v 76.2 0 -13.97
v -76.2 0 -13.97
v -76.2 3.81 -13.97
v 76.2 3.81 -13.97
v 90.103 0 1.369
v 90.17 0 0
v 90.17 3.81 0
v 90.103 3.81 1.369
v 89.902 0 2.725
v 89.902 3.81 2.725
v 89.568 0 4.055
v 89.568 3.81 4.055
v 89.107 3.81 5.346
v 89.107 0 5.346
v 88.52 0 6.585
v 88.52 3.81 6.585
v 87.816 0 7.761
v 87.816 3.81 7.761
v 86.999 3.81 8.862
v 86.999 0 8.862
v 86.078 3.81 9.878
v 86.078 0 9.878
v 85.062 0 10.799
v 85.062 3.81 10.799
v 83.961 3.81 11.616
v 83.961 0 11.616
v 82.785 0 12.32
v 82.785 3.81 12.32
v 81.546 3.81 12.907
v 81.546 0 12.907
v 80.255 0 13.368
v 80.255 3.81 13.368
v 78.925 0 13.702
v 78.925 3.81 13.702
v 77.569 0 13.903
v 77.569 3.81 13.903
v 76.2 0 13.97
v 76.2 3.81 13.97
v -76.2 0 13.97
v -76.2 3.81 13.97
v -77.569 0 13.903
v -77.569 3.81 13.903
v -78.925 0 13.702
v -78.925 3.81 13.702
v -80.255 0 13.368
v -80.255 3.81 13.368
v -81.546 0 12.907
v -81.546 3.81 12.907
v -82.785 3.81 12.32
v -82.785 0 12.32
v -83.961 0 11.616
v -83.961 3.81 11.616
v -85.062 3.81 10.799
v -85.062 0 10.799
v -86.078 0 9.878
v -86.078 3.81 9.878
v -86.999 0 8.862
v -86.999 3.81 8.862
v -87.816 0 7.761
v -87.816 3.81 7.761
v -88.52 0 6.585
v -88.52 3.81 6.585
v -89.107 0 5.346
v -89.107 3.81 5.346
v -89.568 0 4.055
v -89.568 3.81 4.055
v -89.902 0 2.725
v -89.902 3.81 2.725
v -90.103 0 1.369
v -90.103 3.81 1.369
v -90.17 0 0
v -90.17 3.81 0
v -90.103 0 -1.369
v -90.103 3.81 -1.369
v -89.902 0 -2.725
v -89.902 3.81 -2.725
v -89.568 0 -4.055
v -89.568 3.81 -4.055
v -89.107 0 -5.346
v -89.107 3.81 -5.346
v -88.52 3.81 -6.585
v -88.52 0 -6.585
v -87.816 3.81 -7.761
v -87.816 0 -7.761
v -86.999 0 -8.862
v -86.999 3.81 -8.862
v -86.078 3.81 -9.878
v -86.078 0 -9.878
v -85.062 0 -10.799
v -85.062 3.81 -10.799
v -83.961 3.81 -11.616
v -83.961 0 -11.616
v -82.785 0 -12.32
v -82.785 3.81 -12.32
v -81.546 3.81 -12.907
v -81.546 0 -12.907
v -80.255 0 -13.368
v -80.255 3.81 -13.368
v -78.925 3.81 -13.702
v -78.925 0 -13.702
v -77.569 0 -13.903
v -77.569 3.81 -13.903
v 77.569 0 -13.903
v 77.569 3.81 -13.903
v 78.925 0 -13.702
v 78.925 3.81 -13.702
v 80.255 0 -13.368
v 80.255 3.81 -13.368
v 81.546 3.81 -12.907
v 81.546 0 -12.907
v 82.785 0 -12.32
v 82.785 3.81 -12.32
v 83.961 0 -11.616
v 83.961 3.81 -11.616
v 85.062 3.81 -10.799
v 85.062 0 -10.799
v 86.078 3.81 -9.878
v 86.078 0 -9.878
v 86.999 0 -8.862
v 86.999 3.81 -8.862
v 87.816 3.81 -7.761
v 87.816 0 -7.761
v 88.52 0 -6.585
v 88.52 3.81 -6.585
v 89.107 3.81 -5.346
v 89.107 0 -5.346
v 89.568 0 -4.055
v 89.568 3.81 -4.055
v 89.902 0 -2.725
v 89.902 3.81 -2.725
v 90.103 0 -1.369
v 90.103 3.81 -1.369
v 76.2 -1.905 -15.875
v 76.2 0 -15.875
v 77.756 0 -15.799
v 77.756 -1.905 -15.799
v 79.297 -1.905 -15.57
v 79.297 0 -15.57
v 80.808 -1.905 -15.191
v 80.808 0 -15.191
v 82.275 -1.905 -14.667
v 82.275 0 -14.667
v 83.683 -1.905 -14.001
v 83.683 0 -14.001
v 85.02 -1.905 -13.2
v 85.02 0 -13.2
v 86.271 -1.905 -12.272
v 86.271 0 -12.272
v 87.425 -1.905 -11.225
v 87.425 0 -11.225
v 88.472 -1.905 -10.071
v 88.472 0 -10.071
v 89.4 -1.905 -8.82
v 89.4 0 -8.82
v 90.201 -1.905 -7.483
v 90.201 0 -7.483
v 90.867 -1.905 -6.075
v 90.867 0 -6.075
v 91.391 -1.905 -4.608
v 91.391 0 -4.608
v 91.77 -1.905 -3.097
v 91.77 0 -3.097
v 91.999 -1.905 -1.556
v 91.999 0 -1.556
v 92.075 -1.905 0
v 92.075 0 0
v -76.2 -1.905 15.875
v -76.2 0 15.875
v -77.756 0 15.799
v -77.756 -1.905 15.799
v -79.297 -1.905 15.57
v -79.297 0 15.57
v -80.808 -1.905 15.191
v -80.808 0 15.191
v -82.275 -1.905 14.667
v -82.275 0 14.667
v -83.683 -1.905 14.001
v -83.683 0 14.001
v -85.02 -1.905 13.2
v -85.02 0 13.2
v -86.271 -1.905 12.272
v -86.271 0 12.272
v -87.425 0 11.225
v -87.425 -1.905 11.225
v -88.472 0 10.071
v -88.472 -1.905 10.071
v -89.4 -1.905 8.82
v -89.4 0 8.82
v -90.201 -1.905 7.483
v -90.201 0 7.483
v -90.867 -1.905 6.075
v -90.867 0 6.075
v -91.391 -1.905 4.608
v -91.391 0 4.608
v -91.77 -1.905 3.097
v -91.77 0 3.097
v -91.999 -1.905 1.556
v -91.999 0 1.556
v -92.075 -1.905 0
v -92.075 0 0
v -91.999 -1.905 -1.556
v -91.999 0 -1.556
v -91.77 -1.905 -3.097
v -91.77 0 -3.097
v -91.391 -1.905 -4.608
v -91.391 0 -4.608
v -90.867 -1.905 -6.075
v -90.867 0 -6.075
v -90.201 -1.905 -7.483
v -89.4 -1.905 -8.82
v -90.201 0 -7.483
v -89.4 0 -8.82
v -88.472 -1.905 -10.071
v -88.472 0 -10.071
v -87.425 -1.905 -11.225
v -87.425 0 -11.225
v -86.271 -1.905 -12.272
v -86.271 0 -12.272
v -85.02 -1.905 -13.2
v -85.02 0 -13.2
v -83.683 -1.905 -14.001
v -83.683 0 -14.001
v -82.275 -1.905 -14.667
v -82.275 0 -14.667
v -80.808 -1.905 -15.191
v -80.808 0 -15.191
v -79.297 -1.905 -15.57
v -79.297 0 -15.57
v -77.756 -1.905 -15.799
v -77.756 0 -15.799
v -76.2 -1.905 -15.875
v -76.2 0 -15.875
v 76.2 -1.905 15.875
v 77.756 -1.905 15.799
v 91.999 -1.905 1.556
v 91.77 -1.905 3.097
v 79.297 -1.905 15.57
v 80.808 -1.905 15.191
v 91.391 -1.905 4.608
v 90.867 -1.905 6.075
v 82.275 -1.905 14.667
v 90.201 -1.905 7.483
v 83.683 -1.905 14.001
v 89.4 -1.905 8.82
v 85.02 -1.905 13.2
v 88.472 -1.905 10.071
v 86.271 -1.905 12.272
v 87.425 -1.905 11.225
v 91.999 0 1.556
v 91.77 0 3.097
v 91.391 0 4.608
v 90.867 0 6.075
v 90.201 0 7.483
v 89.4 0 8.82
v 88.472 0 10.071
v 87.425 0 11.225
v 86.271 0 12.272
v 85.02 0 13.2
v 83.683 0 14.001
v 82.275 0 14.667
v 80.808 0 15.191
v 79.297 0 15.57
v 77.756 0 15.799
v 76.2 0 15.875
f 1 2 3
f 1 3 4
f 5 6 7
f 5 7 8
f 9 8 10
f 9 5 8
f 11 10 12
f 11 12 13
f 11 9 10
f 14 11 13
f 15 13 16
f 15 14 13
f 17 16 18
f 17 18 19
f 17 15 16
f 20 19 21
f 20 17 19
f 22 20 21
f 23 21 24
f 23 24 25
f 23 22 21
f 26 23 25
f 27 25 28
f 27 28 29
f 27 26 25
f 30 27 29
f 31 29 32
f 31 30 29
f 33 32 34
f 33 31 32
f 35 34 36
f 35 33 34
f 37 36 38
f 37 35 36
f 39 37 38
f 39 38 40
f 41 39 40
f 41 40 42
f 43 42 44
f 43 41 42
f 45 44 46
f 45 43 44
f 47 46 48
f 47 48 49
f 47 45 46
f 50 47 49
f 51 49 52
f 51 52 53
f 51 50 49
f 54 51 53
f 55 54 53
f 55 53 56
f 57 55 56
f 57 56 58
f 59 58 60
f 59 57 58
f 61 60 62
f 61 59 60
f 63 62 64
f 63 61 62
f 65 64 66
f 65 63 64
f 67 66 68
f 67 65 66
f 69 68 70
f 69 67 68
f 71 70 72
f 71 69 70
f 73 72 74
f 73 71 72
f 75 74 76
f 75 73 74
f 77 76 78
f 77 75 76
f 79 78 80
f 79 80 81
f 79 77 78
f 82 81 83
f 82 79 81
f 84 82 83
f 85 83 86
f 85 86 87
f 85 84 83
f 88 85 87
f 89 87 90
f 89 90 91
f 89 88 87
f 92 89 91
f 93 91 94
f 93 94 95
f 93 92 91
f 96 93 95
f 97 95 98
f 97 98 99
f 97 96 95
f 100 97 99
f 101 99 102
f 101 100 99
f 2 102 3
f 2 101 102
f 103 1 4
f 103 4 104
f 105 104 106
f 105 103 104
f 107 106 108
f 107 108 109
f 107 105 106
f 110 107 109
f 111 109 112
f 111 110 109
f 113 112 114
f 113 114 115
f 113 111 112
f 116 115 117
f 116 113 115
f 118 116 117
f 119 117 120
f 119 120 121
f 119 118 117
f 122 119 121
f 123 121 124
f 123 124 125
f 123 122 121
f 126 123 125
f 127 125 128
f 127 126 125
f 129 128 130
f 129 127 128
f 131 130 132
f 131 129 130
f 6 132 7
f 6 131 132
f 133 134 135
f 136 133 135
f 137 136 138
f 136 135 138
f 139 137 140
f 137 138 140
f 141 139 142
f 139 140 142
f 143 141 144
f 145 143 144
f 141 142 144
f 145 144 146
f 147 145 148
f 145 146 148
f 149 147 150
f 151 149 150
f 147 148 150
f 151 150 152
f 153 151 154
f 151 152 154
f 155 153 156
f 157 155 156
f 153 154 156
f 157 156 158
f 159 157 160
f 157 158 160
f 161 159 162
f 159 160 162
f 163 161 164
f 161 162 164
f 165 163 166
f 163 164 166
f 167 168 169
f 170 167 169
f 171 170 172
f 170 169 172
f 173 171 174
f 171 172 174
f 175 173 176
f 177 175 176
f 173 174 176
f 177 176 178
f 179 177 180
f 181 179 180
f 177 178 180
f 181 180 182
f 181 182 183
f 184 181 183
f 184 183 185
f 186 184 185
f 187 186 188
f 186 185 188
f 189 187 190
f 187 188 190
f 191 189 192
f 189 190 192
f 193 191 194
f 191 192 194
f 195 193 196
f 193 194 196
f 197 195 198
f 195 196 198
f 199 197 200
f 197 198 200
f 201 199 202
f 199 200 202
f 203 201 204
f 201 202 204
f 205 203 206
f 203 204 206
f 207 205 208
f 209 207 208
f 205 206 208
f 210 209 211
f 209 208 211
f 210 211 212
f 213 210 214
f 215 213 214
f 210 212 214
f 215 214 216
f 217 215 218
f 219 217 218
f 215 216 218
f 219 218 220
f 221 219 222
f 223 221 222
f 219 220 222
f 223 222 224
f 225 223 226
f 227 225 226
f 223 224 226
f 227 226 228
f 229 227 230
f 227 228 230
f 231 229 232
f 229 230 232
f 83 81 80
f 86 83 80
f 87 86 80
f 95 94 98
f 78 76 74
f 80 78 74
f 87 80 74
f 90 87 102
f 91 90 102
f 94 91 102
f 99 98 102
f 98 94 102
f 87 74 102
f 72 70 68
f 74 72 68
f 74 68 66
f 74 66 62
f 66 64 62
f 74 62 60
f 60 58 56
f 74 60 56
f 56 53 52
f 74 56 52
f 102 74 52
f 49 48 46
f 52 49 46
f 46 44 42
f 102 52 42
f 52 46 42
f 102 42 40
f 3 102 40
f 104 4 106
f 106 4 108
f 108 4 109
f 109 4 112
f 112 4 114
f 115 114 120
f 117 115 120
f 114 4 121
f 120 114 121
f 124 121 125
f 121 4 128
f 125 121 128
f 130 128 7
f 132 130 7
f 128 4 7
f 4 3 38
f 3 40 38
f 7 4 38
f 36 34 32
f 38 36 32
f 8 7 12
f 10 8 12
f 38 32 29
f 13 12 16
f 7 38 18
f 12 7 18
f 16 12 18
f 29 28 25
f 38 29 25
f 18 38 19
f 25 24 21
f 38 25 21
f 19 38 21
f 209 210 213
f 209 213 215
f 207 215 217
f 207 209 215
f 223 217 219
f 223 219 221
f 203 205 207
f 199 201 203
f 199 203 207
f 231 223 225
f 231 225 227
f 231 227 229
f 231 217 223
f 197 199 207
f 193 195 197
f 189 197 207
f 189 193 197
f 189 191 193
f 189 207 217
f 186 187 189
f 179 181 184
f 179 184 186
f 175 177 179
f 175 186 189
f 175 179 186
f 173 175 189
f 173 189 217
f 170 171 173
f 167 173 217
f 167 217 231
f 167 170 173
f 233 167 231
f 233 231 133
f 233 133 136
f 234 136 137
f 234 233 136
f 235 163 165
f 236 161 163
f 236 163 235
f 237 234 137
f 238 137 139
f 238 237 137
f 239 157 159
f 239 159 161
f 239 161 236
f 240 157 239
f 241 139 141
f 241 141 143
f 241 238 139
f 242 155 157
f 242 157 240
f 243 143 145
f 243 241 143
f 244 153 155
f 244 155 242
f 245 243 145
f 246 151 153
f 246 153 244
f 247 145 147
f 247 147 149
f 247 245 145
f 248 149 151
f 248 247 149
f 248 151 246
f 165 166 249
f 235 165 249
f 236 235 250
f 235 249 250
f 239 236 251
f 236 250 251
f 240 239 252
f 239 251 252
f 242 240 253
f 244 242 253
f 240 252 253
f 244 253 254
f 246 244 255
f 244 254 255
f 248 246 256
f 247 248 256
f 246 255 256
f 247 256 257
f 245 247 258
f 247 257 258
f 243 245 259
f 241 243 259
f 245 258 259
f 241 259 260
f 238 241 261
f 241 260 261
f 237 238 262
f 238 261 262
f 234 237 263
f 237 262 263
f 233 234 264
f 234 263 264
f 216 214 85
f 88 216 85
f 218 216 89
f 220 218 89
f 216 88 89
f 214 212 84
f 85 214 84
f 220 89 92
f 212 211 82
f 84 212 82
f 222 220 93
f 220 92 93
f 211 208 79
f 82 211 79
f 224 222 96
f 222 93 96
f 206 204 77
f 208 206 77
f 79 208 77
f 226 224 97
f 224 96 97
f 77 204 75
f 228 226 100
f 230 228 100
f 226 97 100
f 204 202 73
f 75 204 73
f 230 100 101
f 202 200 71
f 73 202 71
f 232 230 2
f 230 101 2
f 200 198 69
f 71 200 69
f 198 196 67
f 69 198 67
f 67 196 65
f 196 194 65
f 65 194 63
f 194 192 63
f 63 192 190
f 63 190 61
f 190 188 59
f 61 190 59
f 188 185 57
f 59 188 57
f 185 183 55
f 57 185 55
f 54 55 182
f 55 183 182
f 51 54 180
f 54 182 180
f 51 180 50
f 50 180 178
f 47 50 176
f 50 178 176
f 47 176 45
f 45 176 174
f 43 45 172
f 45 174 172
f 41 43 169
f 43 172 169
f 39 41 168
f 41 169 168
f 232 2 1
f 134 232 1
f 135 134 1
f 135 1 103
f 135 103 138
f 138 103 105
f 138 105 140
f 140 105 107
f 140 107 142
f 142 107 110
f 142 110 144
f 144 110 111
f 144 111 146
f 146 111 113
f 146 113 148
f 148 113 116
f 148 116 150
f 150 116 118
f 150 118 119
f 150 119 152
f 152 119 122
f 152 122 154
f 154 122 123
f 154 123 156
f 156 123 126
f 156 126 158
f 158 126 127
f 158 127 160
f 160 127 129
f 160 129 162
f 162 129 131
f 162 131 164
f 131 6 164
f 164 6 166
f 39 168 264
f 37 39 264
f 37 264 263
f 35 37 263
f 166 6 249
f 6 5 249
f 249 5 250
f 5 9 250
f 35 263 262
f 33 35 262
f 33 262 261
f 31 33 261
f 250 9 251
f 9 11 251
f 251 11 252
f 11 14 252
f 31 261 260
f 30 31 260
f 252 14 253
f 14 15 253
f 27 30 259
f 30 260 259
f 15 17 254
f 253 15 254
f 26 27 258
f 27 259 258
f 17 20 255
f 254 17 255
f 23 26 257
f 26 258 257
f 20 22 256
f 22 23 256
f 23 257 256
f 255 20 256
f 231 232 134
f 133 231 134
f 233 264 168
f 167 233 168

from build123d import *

# Parameters (mm, degrees)
F2_DEPTH = 1.905
F3_DEPTH = 3.81


with BuildPart() as f2:
    # F0 (on Front) → F2 (new body)
    with BuildSketch(Plane.XZ):
        with BuildLine():
            Line((-76.2, 15.875), (-76.2, 0))
            Line((-76.2, 0), (-60.325, 0))
            ThreePointArc((-60.325, 0), (-64.9746798487, 11.2253201513), (-76.2, 15.875))
        make_face()
        with BuildLine():
            Line((-60.325, 0), (-76.2, 0))
            Line((-76.2, 0), (-76.2, -15.875))
            ThreePointArc((-76.2, -15.875), (-64.9746798487, -11.2253201513), (-60.325, 0))
        make_face()
        with BuildLine():
            Line((-76.2, -15.875), (-76.2, 0))
            Line((-76.2, 0), (-76.2, 15.875))
            ThreePointArc((-76.2, 15.875), (-92.075, 0), (-76.2, -15.875))
        make_face()
        with BuildLine():
            ThreePointArc((-76.2, 15.875), (-64.9746798487, 11.2253201513), (-60.325, 0))
            Line((-60.325, 0), (60.325, 0))
            ThreePointArc((60.325, 0), (64.9746798487, 11.2253201513), (76.2, 15.875))
            Line((76.2, 15.875), (-76.2, 15.875))
        make_face()
        with BuildLine():
            Line((60.325, 0), (-60.325, 0))
            ThreePointArc((-60.325, 0), (-64.9746798487, -11.2253201513), (-76.2, -15.875))
            Line((-76.2, -15.875), (76.2, -15.875))
            ThreePointArc((76.2, -15.875), (64.9746798487, -11.2253201513), (60.325, 0))
        make_face()
        with BuildLine():
            ThreePointArc((76.2, 15.875), (64.9746798487, 11.2253201513), (60.325, 0))
            Line((60.325, 0), (76.2, 0))
            Line((76.2, 0), (76.2, 15.875))
        make_face()
        with BuildLine():
            Line((76.2, 0), (60.325, 0))
            ThreePointArc((60.325, 0), (64.9746798487, -11.2253201513), (76.2, -15.875))
            Line((76.2, -15.875), (76.2, 0))
        make_face()
        with BuildLine():
            Line((76.2, 0), (76.2, -15.875))
            ThreePointArc((76.2, -15.875), (87.4253201513, -11.2253201513), (92.075, 0))
            ThreePointArc((92.075, 0), (87.4253201513, 11.2253201513), (76.2, 15.875))
            Line((76.2, 15.875), (76.2, 0))
        make_face()
    extrude(amount=F2_DEPTH)

    # F1 (on Front) → F3 (join)
    with BuildSketch(Plane.XZ):
        with BuildLine():
            ThreePointArc((76.2, -13.97), (62.23, 0), (76.2, 13.97))
            Line((76.2, 13.97), (-76.2, 13.97))
            ThreePointArc((-76.2, 13.97), (-66.3217182668, 9.8782817332), (-62.23, 0))
            ThreePointArc((-62.23, 0), (-66.3217182668, -9.8782817332), (-76.2, -13.97))
            Line((-76.2, -13.97), (76.2, -13.97))
        make_face()
        with BuildLine():
            ThreePointArc((90.17, 0), (86.0782817332, 9.8782817332), (76.2, 13.97))
            Line((76.2, 13.97), (76.2, -13.97))
            ThreePointArc((76.2, -13.97), (86.0782817332, -9.8782817332), (90.17, 0))
        make_face()
        with BuildLine():
            Line((76.2, -13.97), (76.2, 13.97))
            ThreePointArc((76.2, 13.97), (62.23, 0), (76.2, -13.97))
        make_face()
        with BuildLine():
            ThreePointArc((-62.23, 0), (-66.3217182668, 9.8782817332), (-76.2, 13.97))
            Line((-76.2, 13.97), (-76.2, -13.97))
            ThreePointArc((-76.2, -13.97), (-66.3217182668, -9.8782817332), (-62.23, 0))
        make_face()
        with BuildLine():
            Line((-76.2, -13.97), (-76.2, 13.97))
            ThreePointArc((-76.2, 13.97), (-90.17, 0), (-76.2, -13.97))
        make_face()
    extrude(amount=-F3_DEPTH)


solid = f2.part
